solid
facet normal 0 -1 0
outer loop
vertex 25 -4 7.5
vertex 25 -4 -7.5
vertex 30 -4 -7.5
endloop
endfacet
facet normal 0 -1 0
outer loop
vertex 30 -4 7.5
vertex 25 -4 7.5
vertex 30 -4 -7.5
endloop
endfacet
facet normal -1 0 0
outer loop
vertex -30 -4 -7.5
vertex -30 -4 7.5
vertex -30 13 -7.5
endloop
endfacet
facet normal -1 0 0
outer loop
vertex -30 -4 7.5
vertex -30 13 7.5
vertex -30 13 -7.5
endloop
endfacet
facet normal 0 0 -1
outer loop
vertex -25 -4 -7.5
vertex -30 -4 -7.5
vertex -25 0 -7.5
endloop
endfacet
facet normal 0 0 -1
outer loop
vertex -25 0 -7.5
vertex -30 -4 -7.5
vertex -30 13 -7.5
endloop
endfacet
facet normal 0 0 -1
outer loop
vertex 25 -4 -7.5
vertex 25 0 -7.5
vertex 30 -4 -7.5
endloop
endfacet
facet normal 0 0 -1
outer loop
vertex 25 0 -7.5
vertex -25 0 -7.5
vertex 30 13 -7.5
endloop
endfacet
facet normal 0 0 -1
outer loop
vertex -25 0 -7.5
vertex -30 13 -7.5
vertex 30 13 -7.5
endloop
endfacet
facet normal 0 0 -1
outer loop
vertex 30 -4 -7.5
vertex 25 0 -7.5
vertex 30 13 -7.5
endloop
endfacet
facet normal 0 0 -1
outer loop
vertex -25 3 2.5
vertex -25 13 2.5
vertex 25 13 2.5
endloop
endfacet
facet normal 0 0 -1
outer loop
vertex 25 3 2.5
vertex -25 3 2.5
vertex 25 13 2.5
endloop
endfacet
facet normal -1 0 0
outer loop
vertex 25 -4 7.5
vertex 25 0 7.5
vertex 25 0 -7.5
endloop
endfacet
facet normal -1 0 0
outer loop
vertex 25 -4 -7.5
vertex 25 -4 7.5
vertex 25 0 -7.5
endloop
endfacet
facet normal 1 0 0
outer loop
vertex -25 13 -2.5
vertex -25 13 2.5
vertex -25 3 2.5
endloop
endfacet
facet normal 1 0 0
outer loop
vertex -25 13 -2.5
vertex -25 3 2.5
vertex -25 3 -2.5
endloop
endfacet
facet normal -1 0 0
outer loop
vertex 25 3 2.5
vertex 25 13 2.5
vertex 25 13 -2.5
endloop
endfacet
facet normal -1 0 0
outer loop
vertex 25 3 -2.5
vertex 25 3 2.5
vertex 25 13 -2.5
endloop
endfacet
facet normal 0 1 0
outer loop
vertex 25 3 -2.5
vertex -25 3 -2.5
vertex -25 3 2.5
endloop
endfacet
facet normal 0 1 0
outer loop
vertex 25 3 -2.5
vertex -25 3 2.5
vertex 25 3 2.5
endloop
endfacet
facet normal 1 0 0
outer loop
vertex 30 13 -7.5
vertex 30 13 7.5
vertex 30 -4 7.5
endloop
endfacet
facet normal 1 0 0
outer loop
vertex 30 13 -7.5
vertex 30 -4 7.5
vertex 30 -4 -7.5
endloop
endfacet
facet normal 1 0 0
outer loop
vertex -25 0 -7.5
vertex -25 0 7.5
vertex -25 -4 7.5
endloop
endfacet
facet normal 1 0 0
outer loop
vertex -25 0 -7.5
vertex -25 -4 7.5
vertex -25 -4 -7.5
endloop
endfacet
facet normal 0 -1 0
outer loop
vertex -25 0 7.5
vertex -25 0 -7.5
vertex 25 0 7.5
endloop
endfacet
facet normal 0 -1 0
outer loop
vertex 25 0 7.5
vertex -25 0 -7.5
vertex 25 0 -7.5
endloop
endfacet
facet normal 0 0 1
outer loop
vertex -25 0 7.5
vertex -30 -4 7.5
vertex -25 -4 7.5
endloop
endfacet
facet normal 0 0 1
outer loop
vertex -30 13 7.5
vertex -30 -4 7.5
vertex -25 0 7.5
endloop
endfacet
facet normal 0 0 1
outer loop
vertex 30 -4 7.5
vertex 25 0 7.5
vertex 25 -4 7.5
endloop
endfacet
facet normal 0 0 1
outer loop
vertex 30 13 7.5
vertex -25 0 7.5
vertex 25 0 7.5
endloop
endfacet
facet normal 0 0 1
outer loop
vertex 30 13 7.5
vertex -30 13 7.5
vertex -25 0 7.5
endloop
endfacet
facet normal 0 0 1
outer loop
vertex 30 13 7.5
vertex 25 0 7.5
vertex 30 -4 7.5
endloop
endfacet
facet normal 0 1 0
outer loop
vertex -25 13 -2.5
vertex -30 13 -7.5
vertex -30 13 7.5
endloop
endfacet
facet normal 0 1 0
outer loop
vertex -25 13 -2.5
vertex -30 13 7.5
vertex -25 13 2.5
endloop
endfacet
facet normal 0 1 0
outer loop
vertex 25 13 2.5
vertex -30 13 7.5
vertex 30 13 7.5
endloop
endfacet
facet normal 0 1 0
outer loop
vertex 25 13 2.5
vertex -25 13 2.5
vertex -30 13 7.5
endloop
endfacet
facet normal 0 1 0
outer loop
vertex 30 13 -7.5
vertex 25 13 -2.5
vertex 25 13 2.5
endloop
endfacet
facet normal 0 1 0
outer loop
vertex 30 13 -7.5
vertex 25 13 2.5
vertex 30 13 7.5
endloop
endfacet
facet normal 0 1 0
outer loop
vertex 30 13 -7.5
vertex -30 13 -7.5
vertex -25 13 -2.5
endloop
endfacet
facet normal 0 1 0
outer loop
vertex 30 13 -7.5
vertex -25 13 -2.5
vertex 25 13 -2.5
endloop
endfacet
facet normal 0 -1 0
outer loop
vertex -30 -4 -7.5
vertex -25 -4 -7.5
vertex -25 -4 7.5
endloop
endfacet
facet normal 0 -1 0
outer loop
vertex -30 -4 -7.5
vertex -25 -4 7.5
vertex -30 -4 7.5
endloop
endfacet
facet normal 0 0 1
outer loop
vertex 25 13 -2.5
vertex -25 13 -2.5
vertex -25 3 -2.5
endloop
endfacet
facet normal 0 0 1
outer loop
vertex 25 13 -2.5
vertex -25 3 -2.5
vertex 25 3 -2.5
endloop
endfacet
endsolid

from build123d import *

# Parameters (mm, degrees)
SKETCH1_W           = 60
SKETCH1_H           = 15
BOSS_EXTRUDE1_DEPTH = 13
SKETCH4_W           = 5
SKETCH4_H           = 15
BOSS_EXTRUDE2_DEPTH = 4
SKETCH2_W           = 50
SKETCH2_H           = 5
CUT_EXTRUDE1_DEPTH  = 10


with BuildPart() as part:
    # Sketch1 → Boss-Extrude1 (new body)
    with BuildSketch(Plane(origin=(0, 0, 0), x_dir=(1, 0, 0), z_dir=(0, 1, 0))):
        Rectangle(SKETCH1_W, SKETCH1_H)
    extrude(amount=BOSS_EXTRUDE1_DEPTH)

    # Sketch4 → Boss-Extrude2 (add)
    with BuildSketch(Plane(origin=(0, 0, 0), x_dir=(-1, 0, 0), z_dir=(0, -1, 0))):
        with Locations((27.5, 0)):
            Rectangle(SKETCH4_W, SKETCH4_H)
    boss_extrude2 = extrude(amount=BOSS_EXTRUDE2_DEPTH)

    # Mirror1: Boss-Extrude2 across plane
    add(boss_extrude2.mirror(Plane(origin=(0, 0, 0), x_dir=(0, 0, 1), z_dir=(1, 0, 0))))

    # Sketch2 → Cut-Extrude1 (cut)
    with BuildSketch(Plane(origin=(0, 13, 0), x_dir=(1, 0, 0), z_dir=(0, 1, 0))):
        Rectangle(SKETCH2_W, SKETCH2_H)
    extrude(amount=-CUT_EXTRUDE1_DEPTH, mode=Mode.SUBTRACT)


solid = part.part
